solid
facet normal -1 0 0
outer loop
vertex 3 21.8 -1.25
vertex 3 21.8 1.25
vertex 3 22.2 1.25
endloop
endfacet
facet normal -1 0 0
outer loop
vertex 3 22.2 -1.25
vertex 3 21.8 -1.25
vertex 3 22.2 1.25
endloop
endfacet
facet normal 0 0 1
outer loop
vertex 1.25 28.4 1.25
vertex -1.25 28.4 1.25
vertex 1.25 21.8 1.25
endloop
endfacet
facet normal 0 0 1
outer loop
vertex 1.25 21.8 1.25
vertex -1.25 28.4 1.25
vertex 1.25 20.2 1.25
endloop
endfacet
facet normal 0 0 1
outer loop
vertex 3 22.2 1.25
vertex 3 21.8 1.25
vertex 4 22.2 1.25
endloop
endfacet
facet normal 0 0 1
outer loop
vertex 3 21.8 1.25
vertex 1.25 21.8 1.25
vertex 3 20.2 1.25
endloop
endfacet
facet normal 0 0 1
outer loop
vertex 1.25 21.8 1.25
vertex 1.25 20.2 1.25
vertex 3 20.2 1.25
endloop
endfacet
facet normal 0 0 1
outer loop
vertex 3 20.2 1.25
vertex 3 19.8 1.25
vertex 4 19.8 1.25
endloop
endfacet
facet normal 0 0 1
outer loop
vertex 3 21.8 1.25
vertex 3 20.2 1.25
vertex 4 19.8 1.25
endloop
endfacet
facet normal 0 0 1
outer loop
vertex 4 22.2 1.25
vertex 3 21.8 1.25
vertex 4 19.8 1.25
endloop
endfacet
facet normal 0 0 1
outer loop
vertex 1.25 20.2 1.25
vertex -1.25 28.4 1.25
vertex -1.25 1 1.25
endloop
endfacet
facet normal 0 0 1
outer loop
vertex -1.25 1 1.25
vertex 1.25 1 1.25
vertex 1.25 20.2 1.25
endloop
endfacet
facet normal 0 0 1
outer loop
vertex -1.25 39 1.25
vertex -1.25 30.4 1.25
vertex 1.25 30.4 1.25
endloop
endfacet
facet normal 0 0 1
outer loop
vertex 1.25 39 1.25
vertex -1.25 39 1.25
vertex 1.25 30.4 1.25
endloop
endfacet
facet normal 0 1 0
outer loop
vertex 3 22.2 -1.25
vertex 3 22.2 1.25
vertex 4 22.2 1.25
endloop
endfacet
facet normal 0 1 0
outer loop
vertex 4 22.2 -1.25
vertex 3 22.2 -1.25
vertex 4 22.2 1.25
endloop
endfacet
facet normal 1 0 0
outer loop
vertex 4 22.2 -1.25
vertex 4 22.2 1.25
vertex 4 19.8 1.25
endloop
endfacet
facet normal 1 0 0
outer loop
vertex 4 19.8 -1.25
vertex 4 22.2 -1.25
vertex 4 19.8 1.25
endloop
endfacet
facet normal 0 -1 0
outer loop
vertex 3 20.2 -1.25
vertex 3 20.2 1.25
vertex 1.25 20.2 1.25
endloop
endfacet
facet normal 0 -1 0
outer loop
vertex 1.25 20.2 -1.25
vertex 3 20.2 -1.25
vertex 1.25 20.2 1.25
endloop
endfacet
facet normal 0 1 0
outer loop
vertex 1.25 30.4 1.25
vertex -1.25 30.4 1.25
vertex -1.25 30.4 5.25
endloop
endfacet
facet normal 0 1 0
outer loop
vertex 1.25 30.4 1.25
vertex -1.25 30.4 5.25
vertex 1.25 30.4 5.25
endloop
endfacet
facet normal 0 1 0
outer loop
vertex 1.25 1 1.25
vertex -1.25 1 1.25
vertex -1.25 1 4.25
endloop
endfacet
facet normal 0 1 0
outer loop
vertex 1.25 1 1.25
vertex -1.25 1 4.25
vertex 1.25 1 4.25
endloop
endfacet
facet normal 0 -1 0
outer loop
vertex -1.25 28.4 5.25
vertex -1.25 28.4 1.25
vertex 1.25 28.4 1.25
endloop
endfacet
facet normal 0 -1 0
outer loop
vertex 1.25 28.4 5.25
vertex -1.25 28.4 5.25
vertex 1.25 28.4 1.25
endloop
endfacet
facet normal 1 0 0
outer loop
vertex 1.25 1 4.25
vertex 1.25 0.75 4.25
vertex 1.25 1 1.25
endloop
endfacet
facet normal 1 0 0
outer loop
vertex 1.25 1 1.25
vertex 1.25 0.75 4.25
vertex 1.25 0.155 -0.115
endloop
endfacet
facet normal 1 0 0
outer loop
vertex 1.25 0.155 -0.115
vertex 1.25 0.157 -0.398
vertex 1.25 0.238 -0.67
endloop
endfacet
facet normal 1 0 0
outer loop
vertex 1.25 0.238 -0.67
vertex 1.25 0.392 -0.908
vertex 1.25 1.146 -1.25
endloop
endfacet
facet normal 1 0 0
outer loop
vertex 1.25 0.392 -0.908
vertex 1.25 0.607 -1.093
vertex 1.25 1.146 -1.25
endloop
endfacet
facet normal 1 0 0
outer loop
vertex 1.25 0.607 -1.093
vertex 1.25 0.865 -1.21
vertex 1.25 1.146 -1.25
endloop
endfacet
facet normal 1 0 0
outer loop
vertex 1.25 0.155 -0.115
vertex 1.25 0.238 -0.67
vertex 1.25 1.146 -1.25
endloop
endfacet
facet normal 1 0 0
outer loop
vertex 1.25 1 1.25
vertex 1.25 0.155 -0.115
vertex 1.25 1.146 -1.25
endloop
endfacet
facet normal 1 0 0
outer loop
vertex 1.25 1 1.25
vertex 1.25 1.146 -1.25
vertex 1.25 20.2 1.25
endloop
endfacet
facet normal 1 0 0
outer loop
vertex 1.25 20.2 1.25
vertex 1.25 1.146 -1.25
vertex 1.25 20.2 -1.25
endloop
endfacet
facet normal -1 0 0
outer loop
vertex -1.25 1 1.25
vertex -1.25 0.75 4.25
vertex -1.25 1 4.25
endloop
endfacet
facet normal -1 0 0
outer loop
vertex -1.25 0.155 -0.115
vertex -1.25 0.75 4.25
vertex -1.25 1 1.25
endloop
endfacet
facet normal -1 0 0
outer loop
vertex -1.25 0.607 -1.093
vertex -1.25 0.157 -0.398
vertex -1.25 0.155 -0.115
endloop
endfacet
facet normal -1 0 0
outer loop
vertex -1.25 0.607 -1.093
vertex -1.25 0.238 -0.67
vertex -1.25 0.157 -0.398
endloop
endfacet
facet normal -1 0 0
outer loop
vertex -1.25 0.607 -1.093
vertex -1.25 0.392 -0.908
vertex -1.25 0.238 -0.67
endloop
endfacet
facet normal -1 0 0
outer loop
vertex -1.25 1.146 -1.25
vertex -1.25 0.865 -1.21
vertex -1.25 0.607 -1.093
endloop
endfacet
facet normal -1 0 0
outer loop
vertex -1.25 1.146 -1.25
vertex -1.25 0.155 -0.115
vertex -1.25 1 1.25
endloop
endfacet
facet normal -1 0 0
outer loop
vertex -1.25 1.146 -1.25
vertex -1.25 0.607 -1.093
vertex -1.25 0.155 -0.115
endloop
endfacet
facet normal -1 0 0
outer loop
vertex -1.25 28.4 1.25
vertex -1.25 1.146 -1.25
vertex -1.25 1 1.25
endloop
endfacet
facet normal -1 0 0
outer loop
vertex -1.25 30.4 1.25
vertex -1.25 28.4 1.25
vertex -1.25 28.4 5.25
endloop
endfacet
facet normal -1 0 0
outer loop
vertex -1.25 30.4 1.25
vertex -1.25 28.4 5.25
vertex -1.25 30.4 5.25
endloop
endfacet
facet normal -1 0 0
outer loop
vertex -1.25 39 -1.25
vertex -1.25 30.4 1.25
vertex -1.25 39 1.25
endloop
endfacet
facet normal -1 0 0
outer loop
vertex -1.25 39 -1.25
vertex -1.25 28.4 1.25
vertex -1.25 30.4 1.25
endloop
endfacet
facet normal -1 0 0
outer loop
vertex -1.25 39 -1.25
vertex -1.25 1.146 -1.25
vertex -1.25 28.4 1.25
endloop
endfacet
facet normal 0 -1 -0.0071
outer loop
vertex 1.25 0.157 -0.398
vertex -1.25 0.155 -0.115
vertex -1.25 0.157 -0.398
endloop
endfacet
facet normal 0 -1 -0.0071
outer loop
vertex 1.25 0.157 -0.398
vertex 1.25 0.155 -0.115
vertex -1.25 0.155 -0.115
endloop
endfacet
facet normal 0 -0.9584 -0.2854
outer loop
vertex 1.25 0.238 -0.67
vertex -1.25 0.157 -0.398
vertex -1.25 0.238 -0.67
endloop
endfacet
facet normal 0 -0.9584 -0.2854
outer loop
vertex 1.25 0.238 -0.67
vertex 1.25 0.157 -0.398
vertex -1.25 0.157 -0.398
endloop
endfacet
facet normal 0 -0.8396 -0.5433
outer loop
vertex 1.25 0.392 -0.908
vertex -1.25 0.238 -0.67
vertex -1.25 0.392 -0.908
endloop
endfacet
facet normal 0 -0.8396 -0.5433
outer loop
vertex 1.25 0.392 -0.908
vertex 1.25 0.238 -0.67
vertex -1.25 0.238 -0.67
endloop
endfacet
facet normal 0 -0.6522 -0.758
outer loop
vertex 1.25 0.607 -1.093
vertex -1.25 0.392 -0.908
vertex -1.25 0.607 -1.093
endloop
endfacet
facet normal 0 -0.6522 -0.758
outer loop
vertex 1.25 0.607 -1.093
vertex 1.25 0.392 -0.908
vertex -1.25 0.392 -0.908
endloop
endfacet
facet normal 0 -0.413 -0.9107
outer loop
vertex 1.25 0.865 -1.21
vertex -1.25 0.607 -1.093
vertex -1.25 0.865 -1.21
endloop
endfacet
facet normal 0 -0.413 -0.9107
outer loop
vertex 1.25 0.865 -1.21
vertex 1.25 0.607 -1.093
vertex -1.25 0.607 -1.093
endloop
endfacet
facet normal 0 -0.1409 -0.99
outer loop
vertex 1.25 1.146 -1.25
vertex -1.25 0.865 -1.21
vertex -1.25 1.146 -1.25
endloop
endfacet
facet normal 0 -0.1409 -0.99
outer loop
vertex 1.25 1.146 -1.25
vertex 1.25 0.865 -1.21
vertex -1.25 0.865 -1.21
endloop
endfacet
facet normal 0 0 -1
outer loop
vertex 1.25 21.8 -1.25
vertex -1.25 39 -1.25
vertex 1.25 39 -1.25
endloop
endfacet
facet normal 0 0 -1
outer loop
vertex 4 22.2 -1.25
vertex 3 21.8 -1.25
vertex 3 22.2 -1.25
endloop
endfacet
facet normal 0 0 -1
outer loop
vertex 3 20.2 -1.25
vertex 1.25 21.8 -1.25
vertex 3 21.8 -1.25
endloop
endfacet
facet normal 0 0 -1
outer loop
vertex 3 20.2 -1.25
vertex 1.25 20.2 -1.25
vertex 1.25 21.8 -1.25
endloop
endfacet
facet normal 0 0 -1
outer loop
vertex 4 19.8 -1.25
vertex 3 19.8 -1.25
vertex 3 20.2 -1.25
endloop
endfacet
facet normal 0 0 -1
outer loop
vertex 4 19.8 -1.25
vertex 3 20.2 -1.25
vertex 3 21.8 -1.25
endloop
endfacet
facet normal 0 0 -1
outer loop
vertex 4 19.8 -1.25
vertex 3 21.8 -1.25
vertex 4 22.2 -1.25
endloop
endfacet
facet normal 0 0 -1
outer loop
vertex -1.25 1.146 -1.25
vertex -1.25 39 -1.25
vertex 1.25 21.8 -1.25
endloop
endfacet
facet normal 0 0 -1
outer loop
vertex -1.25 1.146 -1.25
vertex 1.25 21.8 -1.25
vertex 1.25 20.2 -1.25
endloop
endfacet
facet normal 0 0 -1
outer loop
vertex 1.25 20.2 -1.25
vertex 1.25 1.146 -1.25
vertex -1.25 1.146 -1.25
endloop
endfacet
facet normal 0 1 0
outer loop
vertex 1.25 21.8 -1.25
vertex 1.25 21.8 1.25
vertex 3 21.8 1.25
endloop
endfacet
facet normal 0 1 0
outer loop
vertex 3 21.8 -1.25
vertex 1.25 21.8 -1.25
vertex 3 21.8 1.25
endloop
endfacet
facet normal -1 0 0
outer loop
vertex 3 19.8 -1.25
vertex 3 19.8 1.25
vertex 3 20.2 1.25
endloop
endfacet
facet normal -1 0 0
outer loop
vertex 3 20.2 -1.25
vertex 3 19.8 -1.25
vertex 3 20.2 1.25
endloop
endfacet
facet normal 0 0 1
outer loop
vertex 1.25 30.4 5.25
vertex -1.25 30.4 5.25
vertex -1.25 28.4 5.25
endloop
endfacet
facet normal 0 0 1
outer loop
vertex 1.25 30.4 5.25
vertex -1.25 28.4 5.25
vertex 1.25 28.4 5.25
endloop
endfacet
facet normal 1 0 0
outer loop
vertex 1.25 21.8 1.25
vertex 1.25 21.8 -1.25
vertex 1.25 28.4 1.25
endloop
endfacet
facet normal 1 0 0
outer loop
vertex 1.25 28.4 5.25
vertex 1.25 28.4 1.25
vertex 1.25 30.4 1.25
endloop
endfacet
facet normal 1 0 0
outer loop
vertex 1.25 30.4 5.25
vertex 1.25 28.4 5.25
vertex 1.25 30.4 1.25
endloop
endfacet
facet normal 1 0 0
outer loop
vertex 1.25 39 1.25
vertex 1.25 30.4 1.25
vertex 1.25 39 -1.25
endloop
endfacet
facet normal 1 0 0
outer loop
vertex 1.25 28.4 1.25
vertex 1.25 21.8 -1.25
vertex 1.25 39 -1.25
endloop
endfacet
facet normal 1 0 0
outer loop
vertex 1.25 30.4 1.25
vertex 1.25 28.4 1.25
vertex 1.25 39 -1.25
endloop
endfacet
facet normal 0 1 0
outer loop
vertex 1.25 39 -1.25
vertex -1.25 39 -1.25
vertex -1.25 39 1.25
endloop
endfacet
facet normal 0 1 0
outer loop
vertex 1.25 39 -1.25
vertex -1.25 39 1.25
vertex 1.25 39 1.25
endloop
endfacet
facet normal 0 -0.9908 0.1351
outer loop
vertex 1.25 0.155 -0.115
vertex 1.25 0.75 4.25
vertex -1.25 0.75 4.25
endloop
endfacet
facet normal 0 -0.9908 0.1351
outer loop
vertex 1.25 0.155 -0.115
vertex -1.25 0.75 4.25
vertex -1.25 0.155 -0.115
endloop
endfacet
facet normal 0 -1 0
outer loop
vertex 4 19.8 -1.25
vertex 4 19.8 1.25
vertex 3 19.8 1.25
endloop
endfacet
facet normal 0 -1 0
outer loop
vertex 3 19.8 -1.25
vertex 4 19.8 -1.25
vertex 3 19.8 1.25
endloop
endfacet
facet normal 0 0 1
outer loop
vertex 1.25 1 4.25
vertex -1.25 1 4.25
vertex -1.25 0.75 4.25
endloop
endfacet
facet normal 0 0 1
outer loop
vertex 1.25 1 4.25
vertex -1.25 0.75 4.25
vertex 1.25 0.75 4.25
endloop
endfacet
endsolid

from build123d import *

# Parameters (mm, degrees)
SKETCH2_W           = 2.5
SKETCH2_H           = 2.5
BOSS_EXTRUDE1_DEPTH = 39
SKETCH3_W           = 2.5
SKETCH3_H           = 1
BOSS_EXTRUDE2_DEPTH = 3
CUT_EXTRUDE1_DEPTH  = 2.5
FILLET1_R           = 1
BOSS_EXTRUDE3_DEPTH = 2.5
SKETCH8_W           = 2.5
SKETCH8_H           = 2
BOSS_EXTRUDE4_DEPTH = 4


with BuildPart() as part:
    # Sketch2 → Boss-Extrude1 (new body)
    with BuildSketch(Plane(origin=(0, 0, 0), x_dir=(1, 0, 0), z_dir=(0, 1, 0))):
        Rectangle(SKETCH2_W, SKETCH2_H)
    extrude(amount=BOSS_EXTRUDE1_DEPTH)

    # Sketch3 → Boss-Extrude2 (add)
    with BuildSketch(Plane.XY.offset(1.25)):
        with Locations((0, 0.5)):
            Rectangle(SKETCH3_W, SKETCH3_H)
    extrude(amount=BOSS_EXTRUDE2_DEPTH)

    # Sketch4 → Cut-Extrude1 (cut)
    with BuildSketch(Plane(origin=(1.25, 0, 0), x_dir=(0, 0, -1), z_dir=(1, 0, 0))):
        Polygon((-4.25, 0), (-4.25, 0.75), (1.25, 0), align=None)
    extrude(amount=-CUT_EXTRUDE1_DEPTH, mode=Mode.SUBTRACT)

    # Fillet1
    fillet1_edges = [part.edges().sort_by_distance(p)[0] for p in [
        (0, 0, -1.25),
    ]]
    fillet(fillet1_edges, radius=FILLET1_R)

    # Sketch6 → Boss-Extrude3 (add)
    with BuildSketch(Plane.XY.offset(1.25)):
        Polygon((1.25, 20.2), (1.25, 21.8), (3, 21.8), (3, 22.2), (4, 22.2), (4, 19.8), (3, 19.8), (3, 20.2), align=None)
    extrude(amount=-BOSS_EXTRUDE3_DEPTH)

    # Sketch8 → Boss-Extrude4 (add)
    with BuildSketch(Plane.XY.offset(1.25)):
        with Locations((0, 29.4)):
            Rectangle(SKETCH8_W, SKETCH8_H)
    extrude(amount=BOSS_EXTRUDE4_DEPTH)


solid = part.part
